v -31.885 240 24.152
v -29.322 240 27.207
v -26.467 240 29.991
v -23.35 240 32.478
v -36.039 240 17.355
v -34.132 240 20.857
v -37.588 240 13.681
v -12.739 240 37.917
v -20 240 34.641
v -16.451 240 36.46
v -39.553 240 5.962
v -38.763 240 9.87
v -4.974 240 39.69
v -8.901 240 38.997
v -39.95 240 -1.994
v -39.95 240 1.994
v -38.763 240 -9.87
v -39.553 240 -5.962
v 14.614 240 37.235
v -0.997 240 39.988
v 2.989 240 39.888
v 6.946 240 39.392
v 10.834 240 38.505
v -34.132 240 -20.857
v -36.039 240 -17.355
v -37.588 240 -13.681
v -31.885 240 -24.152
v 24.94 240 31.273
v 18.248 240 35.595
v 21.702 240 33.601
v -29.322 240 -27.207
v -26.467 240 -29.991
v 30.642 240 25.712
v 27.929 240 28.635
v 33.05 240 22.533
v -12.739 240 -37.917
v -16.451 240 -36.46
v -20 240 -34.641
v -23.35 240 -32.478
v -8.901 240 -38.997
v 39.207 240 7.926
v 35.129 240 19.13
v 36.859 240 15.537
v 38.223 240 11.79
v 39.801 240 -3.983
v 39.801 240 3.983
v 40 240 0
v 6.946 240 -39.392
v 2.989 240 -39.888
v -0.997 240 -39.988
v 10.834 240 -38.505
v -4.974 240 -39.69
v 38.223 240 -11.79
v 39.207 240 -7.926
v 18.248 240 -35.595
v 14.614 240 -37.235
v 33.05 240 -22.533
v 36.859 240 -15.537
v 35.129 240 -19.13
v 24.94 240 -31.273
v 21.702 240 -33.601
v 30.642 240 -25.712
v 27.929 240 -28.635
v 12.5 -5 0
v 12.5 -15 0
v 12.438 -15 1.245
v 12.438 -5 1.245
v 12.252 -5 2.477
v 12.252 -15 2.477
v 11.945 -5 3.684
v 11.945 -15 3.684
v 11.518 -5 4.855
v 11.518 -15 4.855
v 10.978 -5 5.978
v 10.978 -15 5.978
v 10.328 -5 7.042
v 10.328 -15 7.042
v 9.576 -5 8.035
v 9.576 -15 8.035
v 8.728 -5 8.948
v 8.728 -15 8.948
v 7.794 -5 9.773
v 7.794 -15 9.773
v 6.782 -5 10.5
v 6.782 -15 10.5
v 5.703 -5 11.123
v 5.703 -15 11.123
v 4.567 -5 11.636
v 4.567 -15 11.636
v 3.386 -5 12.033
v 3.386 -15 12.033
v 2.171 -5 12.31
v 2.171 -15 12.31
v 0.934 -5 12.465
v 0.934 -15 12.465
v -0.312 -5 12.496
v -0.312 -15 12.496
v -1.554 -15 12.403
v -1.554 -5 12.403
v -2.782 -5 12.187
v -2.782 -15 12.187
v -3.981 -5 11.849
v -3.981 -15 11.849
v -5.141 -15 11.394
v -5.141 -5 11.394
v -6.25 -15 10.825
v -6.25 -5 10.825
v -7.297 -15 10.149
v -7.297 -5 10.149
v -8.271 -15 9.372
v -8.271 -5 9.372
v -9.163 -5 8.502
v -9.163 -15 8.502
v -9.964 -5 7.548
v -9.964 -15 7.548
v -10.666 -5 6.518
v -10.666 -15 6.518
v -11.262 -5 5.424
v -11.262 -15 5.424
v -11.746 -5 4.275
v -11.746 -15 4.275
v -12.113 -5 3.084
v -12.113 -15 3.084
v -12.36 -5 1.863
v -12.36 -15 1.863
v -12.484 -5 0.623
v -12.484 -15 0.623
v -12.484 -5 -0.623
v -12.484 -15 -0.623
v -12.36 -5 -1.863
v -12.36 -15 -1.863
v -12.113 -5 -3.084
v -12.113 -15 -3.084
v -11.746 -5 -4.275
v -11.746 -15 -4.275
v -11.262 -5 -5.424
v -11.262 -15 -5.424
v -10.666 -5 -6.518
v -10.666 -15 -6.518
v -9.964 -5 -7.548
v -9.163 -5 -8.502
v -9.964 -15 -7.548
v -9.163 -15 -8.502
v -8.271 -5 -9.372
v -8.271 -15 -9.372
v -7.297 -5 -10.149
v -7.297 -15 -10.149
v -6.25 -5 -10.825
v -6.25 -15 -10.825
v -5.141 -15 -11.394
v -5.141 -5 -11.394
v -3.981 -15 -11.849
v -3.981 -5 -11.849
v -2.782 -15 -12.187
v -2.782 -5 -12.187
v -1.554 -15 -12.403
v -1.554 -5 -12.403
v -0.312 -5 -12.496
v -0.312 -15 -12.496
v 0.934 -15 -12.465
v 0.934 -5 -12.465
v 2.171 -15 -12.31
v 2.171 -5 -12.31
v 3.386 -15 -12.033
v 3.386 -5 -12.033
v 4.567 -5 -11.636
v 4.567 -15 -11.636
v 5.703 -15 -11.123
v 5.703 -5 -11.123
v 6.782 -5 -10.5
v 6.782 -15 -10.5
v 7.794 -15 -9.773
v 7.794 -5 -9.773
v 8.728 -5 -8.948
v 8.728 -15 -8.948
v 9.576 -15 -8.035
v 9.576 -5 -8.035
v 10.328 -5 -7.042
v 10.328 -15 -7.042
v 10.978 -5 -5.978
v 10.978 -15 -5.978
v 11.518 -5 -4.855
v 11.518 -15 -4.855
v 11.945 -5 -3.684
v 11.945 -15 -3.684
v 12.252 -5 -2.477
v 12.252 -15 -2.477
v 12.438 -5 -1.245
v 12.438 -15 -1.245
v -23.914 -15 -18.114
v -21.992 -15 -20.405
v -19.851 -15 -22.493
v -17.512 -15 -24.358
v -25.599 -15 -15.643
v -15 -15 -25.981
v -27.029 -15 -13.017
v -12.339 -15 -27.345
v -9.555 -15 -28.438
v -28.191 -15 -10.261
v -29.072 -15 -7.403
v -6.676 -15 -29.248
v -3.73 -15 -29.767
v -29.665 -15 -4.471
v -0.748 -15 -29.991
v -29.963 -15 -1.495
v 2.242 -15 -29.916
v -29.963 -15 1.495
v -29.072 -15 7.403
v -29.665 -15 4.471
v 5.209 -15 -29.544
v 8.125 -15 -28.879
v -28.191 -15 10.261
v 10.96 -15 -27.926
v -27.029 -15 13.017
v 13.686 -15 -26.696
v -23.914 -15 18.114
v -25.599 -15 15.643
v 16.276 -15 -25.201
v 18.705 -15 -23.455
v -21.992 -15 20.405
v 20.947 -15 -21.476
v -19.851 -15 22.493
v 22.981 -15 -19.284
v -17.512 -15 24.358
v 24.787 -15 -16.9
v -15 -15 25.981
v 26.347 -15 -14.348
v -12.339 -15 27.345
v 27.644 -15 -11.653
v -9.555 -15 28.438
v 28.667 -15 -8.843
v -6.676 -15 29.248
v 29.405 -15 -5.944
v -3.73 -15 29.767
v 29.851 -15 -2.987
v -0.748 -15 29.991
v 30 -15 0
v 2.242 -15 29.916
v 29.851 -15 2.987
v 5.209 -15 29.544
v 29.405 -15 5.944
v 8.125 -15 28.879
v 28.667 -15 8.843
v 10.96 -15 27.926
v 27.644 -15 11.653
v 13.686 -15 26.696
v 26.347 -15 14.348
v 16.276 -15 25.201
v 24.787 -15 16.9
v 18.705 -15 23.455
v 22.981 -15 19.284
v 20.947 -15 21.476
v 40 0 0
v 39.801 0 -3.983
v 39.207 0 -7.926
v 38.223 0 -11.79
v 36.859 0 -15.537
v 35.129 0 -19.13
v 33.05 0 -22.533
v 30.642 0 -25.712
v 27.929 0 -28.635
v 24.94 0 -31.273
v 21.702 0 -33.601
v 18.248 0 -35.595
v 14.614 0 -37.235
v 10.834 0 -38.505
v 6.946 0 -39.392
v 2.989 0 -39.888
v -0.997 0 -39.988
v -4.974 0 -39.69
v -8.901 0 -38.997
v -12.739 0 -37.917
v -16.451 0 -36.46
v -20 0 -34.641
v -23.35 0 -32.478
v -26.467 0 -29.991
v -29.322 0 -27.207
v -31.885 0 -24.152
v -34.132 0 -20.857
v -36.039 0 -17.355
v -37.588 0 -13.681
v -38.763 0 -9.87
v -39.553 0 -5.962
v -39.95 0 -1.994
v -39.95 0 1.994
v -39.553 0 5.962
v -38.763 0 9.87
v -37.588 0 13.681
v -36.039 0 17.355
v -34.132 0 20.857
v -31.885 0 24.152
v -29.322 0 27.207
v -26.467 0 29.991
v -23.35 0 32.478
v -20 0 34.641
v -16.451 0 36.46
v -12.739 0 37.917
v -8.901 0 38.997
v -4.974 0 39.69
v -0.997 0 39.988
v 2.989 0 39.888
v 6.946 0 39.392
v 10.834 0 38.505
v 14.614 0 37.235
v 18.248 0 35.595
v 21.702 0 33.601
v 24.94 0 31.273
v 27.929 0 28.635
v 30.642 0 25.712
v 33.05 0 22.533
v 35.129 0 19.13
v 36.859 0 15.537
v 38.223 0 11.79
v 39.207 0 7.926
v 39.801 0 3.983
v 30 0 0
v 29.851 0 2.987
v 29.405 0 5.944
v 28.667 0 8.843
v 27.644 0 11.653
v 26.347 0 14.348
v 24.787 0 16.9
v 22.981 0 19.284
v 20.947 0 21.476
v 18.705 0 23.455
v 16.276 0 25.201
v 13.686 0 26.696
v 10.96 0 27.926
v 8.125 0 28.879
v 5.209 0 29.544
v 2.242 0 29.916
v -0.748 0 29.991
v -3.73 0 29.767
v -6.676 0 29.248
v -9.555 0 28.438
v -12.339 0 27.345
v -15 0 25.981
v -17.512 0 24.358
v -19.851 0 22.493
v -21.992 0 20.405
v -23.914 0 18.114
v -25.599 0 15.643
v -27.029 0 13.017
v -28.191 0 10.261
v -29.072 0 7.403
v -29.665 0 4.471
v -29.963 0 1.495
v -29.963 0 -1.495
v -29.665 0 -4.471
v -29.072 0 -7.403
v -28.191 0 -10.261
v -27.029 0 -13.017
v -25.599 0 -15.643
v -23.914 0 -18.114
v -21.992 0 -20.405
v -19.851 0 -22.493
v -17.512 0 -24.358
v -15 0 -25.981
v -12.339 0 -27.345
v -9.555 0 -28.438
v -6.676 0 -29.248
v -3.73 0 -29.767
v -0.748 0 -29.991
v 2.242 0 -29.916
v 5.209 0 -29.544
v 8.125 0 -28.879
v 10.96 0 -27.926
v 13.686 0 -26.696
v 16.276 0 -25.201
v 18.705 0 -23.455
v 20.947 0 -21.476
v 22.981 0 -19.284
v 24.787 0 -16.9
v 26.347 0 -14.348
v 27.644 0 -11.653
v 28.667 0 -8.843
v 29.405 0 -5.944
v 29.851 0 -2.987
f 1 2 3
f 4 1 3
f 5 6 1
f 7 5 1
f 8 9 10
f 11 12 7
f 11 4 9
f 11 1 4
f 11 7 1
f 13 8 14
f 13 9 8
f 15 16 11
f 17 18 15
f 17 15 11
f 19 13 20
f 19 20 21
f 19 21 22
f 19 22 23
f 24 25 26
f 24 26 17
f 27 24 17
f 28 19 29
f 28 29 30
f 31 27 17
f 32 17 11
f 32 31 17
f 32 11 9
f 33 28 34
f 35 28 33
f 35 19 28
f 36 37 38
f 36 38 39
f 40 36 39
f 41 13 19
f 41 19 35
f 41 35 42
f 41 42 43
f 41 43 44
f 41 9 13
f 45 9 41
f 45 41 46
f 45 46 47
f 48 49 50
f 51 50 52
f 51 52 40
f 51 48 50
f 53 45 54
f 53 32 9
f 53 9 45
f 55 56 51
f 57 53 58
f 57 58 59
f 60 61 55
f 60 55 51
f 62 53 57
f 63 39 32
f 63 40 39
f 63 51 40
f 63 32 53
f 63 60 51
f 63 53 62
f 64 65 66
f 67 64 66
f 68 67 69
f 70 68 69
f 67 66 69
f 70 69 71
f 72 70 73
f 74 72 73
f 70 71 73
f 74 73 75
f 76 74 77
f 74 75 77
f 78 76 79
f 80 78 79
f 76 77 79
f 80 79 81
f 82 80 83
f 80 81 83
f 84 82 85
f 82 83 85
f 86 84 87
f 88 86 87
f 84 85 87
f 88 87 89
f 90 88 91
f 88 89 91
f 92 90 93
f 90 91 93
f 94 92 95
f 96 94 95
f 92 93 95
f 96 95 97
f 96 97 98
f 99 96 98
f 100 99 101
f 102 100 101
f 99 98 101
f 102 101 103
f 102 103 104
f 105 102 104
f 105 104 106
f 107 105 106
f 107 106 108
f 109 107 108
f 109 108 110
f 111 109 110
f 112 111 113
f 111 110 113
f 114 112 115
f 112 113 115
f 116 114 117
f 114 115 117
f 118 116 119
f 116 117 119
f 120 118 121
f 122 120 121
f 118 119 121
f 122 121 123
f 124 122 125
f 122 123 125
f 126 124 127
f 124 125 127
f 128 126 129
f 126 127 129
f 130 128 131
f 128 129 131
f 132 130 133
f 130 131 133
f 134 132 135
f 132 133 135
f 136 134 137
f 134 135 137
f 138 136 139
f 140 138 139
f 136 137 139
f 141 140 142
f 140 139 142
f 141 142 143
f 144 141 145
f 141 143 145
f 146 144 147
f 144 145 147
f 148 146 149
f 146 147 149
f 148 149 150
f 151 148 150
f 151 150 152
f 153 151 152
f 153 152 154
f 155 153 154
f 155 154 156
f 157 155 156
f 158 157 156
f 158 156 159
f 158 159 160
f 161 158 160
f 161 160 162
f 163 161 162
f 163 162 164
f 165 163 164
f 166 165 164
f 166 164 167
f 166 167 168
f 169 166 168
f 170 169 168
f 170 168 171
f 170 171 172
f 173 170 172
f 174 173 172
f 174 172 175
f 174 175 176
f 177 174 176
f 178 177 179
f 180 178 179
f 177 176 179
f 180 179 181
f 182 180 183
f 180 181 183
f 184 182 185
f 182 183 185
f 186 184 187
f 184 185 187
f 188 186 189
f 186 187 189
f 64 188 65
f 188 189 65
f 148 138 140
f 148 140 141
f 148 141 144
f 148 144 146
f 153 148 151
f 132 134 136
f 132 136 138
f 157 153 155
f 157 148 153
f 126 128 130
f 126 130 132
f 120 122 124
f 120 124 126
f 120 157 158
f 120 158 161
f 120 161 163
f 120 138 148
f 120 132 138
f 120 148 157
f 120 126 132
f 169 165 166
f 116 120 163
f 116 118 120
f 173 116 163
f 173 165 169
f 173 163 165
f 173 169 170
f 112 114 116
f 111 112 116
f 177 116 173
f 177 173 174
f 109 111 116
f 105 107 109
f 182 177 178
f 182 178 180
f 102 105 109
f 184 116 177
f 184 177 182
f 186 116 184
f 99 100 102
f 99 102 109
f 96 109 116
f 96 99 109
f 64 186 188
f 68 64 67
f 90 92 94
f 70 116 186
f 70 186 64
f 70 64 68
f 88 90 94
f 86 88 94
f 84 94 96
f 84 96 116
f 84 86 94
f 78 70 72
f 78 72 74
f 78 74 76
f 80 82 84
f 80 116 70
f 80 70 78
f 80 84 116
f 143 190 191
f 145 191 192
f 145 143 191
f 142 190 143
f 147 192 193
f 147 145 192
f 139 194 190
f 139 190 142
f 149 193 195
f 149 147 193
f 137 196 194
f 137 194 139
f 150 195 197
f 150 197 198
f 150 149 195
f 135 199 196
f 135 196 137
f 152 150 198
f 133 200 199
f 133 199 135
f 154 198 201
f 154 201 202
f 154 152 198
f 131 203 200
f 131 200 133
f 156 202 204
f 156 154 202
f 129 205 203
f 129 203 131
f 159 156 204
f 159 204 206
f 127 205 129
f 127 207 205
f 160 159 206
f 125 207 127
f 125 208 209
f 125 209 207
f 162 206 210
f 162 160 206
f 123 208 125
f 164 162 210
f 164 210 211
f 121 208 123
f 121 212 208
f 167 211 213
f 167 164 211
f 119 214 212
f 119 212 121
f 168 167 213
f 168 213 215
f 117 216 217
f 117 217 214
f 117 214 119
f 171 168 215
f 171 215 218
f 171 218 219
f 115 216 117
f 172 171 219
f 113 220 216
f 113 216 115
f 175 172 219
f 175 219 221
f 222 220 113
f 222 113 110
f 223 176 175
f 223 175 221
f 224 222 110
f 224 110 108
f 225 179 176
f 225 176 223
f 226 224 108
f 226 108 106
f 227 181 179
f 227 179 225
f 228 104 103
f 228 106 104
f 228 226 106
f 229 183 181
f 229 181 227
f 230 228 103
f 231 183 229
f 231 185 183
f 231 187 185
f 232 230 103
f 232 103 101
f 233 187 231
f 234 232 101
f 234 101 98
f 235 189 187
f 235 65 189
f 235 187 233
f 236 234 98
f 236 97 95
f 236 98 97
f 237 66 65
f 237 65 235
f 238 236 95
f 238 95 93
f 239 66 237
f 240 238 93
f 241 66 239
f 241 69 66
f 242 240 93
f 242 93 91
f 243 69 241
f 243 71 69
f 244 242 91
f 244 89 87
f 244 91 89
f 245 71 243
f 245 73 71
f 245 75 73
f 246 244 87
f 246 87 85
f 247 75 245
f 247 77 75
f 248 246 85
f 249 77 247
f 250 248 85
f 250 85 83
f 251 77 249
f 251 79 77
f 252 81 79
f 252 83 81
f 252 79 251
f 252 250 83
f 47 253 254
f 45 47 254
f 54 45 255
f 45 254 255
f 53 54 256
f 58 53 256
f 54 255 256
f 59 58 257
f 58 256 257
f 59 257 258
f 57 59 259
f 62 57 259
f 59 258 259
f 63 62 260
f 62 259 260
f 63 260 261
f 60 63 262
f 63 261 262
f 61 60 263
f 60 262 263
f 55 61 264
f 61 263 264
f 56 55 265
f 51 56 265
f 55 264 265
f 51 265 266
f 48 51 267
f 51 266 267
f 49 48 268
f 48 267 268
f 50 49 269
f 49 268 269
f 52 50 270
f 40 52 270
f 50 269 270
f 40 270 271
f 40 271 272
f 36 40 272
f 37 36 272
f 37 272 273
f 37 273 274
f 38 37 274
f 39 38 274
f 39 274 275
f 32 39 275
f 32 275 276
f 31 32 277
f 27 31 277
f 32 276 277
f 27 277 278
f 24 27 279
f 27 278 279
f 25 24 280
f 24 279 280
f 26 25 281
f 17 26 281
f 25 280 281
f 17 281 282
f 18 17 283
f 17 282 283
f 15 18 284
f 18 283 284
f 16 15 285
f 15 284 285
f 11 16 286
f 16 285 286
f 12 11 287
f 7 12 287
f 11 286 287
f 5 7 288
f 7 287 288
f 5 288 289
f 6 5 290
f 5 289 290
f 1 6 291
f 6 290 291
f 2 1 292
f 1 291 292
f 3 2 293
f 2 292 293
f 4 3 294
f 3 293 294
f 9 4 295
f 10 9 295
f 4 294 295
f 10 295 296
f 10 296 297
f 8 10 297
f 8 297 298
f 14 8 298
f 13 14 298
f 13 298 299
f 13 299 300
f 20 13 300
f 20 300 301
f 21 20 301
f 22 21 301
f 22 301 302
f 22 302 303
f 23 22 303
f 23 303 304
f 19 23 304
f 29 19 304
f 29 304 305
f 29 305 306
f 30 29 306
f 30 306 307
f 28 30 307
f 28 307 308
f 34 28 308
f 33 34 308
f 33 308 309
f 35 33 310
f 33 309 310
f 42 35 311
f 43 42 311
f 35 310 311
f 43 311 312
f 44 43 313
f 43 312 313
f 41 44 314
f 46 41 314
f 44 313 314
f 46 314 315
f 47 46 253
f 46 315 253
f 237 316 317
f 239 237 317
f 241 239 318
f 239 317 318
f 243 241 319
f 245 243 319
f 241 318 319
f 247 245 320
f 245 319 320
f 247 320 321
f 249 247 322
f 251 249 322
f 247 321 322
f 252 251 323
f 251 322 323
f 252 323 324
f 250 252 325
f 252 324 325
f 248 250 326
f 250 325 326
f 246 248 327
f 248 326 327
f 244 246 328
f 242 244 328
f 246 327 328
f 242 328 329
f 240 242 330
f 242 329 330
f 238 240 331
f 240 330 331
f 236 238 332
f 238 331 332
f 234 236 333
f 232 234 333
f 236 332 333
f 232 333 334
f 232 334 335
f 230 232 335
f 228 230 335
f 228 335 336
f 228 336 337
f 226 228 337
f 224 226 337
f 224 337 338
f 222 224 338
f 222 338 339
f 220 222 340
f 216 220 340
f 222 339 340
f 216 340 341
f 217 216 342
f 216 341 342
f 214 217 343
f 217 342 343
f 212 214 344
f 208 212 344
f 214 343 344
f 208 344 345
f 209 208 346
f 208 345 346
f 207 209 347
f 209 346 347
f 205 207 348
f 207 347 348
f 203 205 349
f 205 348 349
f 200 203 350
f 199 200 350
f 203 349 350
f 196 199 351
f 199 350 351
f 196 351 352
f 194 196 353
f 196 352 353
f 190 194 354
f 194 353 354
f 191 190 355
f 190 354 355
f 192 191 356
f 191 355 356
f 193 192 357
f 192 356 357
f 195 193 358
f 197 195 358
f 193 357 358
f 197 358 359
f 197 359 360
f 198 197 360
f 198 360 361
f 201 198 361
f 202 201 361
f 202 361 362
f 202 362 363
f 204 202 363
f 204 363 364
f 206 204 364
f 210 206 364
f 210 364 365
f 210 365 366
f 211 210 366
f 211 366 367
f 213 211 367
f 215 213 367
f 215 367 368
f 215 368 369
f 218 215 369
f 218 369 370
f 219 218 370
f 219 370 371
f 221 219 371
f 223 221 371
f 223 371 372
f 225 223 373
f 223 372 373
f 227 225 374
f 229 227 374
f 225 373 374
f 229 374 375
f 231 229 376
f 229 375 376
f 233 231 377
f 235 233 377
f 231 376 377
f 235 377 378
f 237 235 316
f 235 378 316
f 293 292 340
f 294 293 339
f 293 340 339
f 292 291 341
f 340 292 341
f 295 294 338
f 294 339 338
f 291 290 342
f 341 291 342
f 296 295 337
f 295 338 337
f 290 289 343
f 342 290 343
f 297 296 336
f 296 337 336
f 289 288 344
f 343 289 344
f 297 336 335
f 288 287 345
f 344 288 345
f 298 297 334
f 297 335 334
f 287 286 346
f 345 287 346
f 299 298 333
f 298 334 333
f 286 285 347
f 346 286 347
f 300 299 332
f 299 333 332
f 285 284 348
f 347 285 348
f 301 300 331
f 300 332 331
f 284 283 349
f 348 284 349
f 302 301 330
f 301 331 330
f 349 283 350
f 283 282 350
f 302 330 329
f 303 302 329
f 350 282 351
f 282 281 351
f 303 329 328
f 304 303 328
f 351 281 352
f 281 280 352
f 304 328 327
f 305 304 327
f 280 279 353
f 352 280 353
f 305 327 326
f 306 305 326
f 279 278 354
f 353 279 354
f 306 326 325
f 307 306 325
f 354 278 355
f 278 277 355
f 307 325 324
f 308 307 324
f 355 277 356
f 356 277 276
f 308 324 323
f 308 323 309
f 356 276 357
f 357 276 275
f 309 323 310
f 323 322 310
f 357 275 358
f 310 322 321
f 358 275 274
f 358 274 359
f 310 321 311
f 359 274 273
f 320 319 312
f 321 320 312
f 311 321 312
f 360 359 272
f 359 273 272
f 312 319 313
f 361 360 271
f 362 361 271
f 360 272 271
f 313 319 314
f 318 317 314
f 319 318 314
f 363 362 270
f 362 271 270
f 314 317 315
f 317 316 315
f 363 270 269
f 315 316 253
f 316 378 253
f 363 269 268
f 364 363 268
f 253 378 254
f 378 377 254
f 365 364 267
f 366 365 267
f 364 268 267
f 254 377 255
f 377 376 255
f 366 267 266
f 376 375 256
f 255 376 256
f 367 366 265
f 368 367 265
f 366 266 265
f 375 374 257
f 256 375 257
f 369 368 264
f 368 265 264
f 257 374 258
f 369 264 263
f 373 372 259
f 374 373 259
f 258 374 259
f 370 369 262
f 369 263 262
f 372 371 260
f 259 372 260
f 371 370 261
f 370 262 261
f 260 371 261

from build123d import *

# Parameters (mm, degrees)
SKETCH1_R           = 40
BOSS_EXTRUDE1_DEPTH = 240
SKETCH2_R           = 30
BOSS_EXTRUDE2_DEPTH = 15
SKETCH3_R           = 12.5
CUT_EXTRUDE2_DEPTH  = 10


with BuildPart() as part:
    # Sketch1 → Boss-Extrude1 (new body)
    with BuildSketch(Plane(origin=(0, 0, 0), x_dir=(1, 0, 0), z_dir=(0, 1, 0))):
        Circle(SKETCH1_R)
    extrude(amount=BOSS_EXTRUDE1_DEPTH)

    # Sketch2 → Boss-Extrude2 (add)
    with BuildSketch(Plane.XZ):
        Circle(SKETCH2_R)
    extrude(amount=BOSS_EXTRUDE2_DEPTH)

    # Sketch3 → Cut-Extrude2 (cut)
    with BuildSketch(Plane.XZ.offset(15)):
        Circle(SKETCH3_R)
    extrude(amount=-CUT_EXTRUDE2_DEPTH, mode=Mode.SUBTRACT)


solid = part.part
